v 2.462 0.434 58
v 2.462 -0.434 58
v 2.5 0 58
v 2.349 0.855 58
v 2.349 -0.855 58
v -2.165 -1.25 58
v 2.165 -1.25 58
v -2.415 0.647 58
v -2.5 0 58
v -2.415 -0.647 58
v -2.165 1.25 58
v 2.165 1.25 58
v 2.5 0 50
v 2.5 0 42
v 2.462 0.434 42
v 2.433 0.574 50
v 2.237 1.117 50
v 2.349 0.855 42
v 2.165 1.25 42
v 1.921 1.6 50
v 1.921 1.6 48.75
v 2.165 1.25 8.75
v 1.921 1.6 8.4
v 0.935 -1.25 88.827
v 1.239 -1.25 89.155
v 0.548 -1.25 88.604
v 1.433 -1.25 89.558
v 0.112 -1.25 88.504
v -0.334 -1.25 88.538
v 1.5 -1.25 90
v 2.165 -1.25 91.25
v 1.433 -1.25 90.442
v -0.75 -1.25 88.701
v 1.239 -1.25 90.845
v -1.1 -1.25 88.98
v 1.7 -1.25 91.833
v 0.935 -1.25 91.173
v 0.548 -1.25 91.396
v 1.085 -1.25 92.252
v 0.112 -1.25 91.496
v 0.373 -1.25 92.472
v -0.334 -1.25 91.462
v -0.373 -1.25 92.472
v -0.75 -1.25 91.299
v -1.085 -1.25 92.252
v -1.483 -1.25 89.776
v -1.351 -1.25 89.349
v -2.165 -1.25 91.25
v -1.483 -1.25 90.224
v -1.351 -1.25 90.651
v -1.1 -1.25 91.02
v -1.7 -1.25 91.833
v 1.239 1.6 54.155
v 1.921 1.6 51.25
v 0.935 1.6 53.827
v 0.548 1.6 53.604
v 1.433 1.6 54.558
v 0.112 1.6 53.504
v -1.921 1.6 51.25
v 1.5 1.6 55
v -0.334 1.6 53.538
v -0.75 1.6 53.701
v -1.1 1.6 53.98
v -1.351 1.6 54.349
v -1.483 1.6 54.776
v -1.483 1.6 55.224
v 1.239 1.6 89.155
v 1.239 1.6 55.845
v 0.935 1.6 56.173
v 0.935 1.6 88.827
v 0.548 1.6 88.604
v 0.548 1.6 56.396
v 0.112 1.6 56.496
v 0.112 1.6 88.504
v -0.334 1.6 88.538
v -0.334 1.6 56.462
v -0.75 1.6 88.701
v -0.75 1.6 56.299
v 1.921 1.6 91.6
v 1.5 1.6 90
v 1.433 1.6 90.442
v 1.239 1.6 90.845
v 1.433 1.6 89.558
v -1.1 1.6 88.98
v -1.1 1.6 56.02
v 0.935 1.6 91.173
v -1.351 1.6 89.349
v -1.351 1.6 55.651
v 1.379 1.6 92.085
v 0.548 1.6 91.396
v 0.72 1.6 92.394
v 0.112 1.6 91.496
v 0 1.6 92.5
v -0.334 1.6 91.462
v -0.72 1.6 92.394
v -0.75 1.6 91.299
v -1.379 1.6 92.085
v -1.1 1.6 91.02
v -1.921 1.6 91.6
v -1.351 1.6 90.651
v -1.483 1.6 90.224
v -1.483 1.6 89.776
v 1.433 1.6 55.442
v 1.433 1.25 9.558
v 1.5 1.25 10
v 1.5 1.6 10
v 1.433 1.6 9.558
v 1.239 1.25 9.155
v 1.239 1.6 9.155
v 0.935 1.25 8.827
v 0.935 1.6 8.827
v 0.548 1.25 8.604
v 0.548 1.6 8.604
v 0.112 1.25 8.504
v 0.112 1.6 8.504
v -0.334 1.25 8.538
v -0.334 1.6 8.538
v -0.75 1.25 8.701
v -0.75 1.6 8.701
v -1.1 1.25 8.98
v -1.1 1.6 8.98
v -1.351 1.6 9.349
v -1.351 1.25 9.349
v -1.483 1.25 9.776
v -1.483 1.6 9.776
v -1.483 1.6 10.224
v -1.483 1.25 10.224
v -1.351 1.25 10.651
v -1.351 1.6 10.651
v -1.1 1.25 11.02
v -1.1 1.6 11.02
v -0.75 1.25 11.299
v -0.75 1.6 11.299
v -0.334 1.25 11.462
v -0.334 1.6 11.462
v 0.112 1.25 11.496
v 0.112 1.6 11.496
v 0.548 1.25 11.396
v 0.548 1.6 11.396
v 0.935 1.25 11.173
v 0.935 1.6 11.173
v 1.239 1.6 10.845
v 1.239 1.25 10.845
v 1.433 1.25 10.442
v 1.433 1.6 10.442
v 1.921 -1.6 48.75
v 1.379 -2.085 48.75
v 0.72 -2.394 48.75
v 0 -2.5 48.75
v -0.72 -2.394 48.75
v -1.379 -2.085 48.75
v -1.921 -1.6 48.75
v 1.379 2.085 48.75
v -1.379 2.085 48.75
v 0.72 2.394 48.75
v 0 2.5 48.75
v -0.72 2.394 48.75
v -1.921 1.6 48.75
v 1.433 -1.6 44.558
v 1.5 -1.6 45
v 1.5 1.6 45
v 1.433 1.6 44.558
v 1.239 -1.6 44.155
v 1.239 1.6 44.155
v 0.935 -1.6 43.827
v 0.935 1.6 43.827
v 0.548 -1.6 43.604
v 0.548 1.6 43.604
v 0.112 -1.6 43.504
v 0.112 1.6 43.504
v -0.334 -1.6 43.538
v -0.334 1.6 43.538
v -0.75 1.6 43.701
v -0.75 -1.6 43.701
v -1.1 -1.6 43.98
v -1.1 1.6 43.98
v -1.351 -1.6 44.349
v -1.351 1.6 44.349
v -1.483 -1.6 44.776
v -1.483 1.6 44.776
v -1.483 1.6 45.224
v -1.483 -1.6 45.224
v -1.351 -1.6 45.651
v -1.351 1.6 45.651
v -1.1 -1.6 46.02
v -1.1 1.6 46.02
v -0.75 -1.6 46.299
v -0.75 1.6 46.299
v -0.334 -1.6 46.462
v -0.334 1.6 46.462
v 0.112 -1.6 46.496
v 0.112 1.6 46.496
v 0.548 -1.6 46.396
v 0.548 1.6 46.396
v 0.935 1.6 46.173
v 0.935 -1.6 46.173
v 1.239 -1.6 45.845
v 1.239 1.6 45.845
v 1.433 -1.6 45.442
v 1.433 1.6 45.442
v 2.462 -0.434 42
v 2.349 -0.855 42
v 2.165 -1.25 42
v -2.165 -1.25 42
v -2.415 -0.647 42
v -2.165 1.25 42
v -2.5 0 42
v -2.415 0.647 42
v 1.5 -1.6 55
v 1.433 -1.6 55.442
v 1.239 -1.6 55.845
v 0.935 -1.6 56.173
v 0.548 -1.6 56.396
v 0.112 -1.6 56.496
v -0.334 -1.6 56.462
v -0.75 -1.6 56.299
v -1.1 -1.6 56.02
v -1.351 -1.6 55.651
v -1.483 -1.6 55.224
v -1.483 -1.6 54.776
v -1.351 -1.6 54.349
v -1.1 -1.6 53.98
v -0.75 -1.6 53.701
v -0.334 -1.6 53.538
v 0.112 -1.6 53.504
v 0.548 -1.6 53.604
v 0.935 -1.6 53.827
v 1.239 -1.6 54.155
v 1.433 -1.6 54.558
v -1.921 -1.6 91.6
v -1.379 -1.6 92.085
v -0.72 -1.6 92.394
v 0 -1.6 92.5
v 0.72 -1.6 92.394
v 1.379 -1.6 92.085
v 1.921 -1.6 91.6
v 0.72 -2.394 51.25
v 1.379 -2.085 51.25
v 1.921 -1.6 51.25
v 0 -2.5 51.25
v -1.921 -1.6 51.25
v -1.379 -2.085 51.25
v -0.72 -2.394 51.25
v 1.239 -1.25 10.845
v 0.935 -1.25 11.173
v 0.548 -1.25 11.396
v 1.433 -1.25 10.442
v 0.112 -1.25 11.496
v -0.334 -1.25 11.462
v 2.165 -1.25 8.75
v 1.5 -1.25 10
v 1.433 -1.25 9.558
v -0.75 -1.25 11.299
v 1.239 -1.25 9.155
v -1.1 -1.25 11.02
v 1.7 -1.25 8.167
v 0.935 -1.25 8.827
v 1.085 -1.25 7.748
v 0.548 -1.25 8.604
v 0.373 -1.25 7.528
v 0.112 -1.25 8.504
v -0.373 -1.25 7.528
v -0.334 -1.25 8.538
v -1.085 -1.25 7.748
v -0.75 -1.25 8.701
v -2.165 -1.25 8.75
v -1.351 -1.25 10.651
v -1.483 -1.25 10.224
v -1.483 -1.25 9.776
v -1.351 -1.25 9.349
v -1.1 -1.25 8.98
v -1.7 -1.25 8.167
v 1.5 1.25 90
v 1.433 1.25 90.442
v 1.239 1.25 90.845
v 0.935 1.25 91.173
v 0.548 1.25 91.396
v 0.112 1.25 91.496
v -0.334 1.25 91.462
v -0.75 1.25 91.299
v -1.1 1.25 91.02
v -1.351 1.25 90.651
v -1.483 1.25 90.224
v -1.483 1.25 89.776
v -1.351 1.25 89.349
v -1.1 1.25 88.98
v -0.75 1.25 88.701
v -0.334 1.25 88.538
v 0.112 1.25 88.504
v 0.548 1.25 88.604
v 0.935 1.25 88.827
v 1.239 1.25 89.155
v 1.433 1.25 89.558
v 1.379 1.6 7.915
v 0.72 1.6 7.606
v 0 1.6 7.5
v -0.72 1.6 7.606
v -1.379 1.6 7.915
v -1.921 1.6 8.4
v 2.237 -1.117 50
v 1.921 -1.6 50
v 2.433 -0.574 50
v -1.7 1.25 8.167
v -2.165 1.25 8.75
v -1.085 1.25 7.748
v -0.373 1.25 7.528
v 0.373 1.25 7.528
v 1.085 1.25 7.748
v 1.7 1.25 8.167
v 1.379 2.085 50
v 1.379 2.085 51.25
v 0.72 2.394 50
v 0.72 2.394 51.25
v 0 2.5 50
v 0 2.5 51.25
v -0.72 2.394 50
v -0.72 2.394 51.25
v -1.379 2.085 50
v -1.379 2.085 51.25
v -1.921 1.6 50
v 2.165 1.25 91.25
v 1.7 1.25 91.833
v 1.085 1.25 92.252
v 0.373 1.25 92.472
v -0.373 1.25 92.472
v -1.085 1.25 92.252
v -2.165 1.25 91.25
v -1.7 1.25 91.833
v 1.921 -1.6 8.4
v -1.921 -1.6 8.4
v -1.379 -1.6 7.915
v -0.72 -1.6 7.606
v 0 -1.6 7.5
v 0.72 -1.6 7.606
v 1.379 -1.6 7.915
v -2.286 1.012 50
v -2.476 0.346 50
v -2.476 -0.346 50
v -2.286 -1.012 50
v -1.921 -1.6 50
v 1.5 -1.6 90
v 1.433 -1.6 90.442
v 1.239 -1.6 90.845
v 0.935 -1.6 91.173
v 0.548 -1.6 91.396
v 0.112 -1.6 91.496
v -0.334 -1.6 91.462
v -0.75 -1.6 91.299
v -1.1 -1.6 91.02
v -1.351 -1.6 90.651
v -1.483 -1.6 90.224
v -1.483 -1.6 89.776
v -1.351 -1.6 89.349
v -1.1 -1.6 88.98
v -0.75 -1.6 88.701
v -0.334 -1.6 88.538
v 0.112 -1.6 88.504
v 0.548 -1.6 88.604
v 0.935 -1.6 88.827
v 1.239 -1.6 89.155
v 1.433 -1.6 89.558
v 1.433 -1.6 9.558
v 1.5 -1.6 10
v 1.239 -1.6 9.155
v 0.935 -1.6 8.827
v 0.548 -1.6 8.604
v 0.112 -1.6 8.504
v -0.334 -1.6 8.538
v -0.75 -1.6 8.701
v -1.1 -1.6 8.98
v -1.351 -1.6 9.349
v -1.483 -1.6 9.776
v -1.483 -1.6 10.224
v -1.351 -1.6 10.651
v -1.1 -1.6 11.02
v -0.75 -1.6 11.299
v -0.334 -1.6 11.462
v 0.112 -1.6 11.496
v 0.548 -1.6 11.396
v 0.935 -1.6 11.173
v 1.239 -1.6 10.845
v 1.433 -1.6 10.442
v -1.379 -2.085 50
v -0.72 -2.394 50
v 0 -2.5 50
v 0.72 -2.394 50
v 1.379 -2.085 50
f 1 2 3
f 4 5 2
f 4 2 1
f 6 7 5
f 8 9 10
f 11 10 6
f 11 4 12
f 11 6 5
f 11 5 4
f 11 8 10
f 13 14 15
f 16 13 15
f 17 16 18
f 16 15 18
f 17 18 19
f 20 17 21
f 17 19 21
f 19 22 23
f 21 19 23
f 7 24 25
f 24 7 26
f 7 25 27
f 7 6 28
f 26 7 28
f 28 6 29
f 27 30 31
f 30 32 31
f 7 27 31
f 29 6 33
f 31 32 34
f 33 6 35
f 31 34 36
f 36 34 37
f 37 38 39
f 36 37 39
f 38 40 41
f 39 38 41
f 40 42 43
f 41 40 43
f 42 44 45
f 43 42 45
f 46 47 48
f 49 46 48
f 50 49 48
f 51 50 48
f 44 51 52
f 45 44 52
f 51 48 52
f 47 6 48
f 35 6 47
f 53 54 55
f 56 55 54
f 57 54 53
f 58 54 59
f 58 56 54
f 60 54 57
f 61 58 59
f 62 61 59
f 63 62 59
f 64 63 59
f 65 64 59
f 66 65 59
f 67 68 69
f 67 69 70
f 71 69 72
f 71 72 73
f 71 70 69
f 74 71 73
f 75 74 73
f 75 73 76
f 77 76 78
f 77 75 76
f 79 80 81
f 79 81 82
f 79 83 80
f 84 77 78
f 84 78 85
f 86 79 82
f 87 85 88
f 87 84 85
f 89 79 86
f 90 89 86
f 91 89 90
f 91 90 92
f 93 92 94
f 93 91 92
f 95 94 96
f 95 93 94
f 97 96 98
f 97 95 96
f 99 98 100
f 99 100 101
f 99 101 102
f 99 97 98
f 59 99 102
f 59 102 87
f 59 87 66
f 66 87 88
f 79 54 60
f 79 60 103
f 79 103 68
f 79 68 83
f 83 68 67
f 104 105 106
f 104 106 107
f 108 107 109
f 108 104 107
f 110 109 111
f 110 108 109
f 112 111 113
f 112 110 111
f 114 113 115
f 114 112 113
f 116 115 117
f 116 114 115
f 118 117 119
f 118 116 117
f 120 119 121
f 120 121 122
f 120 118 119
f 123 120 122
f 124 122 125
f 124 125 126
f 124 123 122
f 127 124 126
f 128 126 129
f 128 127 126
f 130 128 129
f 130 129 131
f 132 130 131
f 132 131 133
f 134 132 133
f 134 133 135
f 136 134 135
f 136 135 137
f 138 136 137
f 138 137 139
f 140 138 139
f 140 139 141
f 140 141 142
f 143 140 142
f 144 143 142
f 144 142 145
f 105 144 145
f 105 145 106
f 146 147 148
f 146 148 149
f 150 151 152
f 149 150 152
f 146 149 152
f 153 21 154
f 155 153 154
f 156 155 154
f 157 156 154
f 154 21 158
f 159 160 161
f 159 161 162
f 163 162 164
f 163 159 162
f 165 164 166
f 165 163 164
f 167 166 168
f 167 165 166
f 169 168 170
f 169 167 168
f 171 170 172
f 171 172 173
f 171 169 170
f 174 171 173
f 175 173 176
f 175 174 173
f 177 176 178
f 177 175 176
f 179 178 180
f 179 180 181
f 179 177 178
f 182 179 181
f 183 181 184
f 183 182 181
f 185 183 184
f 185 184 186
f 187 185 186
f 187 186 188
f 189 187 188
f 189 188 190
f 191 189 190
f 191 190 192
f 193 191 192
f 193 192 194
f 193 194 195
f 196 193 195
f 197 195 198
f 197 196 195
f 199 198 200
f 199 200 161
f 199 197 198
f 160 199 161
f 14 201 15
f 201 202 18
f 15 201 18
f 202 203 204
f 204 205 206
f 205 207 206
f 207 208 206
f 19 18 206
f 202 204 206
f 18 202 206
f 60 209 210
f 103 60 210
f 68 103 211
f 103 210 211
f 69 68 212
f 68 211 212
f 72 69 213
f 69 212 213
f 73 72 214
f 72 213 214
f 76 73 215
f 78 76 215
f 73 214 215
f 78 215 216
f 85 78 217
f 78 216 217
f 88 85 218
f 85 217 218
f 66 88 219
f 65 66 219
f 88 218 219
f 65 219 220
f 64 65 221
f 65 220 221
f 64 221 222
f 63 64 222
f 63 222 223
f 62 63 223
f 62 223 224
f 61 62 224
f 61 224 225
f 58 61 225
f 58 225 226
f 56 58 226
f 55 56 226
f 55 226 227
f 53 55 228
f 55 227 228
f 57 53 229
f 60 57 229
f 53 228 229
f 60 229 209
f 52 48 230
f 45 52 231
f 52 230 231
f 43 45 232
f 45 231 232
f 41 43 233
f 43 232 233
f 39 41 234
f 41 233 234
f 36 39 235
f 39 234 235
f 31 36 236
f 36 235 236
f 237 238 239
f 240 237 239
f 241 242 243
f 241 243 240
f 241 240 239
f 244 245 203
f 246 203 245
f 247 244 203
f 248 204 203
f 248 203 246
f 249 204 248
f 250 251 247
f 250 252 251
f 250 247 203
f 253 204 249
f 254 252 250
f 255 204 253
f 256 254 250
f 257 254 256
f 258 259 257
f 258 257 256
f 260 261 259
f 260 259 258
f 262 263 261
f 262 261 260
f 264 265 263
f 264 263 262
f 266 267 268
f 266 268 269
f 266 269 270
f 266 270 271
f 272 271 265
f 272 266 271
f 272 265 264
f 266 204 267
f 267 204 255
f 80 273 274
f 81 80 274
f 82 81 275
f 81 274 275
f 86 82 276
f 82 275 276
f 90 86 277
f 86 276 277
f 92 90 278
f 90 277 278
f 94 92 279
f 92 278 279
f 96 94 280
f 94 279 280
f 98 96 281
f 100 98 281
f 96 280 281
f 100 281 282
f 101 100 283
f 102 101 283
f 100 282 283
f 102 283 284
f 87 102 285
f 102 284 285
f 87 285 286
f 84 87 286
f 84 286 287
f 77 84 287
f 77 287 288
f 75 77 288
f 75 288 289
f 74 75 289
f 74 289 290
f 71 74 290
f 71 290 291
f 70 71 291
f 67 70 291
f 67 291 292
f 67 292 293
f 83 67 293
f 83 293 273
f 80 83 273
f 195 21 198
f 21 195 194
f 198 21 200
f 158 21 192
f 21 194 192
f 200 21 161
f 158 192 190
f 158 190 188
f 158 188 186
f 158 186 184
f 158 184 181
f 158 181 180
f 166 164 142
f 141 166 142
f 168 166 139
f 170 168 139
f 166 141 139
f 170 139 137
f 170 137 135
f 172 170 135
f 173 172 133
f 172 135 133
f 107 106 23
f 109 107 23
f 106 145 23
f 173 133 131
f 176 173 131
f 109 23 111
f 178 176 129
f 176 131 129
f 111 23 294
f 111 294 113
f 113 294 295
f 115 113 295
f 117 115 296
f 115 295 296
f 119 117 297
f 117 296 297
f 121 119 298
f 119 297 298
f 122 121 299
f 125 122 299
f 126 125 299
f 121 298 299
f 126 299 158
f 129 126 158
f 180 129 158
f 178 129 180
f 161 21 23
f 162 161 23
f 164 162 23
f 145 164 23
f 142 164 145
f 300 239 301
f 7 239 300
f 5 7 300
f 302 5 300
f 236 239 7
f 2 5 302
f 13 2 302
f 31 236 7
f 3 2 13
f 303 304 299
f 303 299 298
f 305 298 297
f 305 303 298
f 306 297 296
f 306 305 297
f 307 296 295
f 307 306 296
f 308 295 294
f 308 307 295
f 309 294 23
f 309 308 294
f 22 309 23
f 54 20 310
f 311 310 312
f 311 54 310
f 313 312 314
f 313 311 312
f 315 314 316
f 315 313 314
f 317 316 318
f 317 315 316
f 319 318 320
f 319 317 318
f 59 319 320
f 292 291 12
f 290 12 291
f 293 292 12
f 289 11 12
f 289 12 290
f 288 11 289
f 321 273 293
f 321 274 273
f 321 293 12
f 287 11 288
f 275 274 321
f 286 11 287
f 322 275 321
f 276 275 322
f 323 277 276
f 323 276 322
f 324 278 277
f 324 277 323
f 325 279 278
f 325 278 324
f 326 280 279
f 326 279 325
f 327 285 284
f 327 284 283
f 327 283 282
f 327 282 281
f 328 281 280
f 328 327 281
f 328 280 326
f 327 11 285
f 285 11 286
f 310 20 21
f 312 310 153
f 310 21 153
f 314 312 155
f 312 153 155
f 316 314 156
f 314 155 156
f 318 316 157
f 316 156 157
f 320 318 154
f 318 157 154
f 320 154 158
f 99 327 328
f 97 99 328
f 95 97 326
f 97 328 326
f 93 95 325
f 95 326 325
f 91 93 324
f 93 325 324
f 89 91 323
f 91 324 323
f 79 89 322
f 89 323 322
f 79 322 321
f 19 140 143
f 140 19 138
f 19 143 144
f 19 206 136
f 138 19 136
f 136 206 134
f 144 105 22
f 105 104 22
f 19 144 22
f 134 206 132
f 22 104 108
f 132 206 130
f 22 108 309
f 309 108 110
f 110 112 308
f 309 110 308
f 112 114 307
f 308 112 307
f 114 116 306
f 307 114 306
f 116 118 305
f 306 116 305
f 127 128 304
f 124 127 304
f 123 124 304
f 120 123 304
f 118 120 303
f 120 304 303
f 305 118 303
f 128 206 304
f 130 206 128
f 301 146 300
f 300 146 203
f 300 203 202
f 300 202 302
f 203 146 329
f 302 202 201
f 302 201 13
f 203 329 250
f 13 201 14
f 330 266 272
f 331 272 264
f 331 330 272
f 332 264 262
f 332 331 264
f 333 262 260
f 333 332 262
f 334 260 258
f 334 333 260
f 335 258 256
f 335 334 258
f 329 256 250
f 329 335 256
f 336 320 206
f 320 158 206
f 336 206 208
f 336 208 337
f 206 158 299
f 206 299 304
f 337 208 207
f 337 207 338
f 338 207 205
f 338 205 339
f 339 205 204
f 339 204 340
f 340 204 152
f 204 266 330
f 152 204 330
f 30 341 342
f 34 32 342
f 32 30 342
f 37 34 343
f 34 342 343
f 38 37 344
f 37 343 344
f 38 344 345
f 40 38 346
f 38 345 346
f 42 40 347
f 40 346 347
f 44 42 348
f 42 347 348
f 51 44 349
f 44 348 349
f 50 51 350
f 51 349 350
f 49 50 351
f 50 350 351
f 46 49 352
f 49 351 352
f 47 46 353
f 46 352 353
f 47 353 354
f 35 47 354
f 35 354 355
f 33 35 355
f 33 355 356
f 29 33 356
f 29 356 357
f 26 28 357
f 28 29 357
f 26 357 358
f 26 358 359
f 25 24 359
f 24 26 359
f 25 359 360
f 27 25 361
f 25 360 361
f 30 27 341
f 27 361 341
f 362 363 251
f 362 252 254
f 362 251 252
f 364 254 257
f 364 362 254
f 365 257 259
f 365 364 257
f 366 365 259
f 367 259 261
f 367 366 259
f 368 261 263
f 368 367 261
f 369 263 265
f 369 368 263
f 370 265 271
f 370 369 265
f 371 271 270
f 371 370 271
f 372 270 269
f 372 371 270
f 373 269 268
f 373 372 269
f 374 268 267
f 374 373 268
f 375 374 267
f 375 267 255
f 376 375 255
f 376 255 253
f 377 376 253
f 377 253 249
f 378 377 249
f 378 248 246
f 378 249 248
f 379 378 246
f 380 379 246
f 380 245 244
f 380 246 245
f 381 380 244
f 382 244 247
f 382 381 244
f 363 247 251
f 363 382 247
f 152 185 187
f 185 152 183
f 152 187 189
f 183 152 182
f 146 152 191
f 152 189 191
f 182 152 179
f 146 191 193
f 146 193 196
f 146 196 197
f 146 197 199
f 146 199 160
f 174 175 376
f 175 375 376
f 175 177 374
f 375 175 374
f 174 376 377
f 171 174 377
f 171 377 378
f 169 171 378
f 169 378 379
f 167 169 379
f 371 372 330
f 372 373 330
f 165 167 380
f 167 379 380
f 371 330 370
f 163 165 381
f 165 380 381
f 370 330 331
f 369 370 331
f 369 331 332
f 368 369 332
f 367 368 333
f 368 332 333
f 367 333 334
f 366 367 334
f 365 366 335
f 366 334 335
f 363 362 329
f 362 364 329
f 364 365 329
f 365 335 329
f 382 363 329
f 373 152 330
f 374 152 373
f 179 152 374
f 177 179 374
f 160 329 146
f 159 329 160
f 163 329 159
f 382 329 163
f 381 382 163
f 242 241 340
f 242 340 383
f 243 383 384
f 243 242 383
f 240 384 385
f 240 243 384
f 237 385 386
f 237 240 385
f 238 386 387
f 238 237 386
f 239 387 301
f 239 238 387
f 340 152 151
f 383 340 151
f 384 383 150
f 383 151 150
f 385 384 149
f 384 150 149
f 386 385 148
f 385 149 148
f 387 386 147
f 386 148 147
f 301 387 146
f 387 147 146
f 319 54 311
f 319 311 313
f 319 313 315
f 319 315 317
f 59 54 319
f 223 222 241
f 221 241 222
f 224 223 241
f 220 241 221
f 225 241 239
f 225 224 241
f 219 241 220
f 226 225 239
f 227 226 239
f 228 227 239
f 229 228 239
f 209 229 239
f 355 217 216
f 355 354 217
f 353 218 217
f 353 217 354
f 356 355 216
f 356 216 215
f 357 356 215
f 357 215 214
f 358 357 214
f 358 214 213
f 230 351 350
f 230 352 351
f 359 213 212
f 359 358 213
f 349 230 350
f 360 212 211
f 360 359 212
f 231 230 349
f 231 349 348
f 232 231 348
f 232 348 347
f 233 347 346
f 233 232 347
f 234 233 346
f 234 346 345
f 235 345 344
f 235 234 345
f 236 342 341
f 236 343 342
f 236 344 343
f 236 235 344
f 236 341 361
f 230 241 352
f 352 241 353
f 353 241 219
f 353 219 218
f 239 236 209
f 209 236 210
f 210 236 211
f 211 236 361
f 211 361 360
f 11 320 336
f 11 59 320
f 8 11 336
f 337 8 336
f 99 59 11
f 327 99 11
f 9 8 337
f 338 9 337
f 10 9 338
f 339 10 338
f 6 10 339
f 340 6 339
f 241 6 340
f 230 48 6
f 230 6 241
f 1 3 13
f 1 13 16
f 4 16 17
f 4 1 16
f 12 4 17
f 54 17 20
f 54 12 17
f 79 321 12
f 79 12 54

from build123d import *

# Parameters (mm, degrees)
EXTRUDE_1_DEPTH          = 100
CUT_EXTRUDE_START        = -1.6
CUT_EXTRUDE_2_OUTLINE_W  = 11.543856376
CUT_EXTRUDE_2_OUTLINE_H  = 103.894707388
CUT_EXTRUDE_2_OUTLINE_R  = 1.5
CUT_EXTRUDE_2_DEPTH      = 3.2
CUT_EXTRUDE_3_DEPTH      = 22
CUT_EXTRUDE_3_DEPTH_BACK = 22
SKETCH_6_W               = 64
SKETCH_6_H               = 2.5
EXTRUDE_START            = -1.25
SKETCH_7_R               = 2.5
EXTRUDE_2_DEPTH          = 1.25


# Read off the part's stored shape, not the designer's step: 切除-拉伸2
with BuildPart() as part:
    # 草图1 → 凸台-拉伸1 (new body)
    with BuildSketch(Plane.XY):
        with BuildLine():
            Line((1.920937271, 1.6), (0, 1.6))
            Line((0, 1.6), (0, -1.6))
            Line((0, -1.6), (1.920937271, -1.6))
            ThreePointArc((1.920937271, -1.6), (2.350781059, -0.850781059), (2.5, 0))
            ThreePointArc((2.5, 0), (2.350781059, 0.850781059), (1.920937271, 1.6))
        make_face()
        with BuildLine():
            Line((0, -1.6), (0, 1.6))
            Line((0, 1.6), (-1.920937271, 1.6))
            ThreePointArc((-1.920937271, 1.6), (-2.5, 0), (-1.920937271, -1.6))
            Line((-1.920937271, -1.6), (0, -1.6))
        make_face()
    extrude(amount=EXTRUDE_1_DEPTH)

    # 切除-拉伸2 outline → 切除-拉伸2 (cut)
    # profile 1 of 3: a face of its own
    with BuildSketch(Plane(origin=(0, 0, 0), x_dir=(1, 0, 0), z_dir=(0, 1, 0)).offset(CUT_EXTRUDE_START)):
        with Locations((0.333099219, -49.873134062)):
            Rectangle(CUT_EXTRUDE_2_OUTLINE_W, CUT_EXTRUDE_2_OUTLINE_H)
        with BuildLine():
            Line((-2.5, -50), (-2.5, -10))
            ThreePointArc((-2.5, -10), (0, -7.5), (2.5, -10))
            Line((2.5, -10), (2.5, -50))
            Line((2.5, -50), (-2.5, -50))
        make_face(mode=Mode.SUBTRACT)
    # profile 2 of 3: a face of its own
    with BuildSketch(Plane(origin=(0, 0, 0), x_dir=(1, 0, 0), z_dir=(0, 1, 0)).offset(CUT_EXTRUDE_START)):
        with Locations((0, -45)):
            Circle(CUT_EXTRUDE_2_OUTLINE_R)
    # profile 3 of 3: a face of its own
    with BuildSketch(Plane(origin=(0, 0, 0), x_dir=(1, 0, 0), z_dir=(0, 1, 0)).offset(CUT_EXTRUDE_START)):
        with Locations((0, -10)):
            Circle(CUT_EXTRUDE_2_OUTLINE_R)
    extrude(amount=CUT_EXTRUDE_2_DEPTH, mode=Mode.SUBTRACT)

    # 草图6 → 切除-拉伸3 (cut, two sides: drawn at the far end of the back side and taken through both)
    with BuildSketch(Plane(origin=(0, 0, 0), x_dir=(0, 0, -1), z_dir=(1, 0, 0)).offset(-CUT_EXTRUDE_3_DEPTH_BACK)):
        with Locations((-10, 0)):
            Rectangle(SKETCH_6_W, SKETCH_6_H)
    extrude(amount=CUT_EXTRUDE_3_DEPTH + CUT_EXTRUDE_3_DEPTH_BACK, mode=Mode.SUBTRACT)

    # 草图7 → 凸台-拉伸2 (add)
    with BuildSketch(Plane.XY.offset(50).offset(EXTRUDE_START)):
        with Locations(Location((0, 0, 0), (0, 0, 150))):
            Circle(SKETCH_7_R)
    extrude(amount=EXTRUDE_2_DEPTH)

    # 镜向1: part across face


with BuildPart() as part_1:
    add(part.part)
    add(part.part.mirror(Plane.XY.offset(50)))


solid = part_1.part
